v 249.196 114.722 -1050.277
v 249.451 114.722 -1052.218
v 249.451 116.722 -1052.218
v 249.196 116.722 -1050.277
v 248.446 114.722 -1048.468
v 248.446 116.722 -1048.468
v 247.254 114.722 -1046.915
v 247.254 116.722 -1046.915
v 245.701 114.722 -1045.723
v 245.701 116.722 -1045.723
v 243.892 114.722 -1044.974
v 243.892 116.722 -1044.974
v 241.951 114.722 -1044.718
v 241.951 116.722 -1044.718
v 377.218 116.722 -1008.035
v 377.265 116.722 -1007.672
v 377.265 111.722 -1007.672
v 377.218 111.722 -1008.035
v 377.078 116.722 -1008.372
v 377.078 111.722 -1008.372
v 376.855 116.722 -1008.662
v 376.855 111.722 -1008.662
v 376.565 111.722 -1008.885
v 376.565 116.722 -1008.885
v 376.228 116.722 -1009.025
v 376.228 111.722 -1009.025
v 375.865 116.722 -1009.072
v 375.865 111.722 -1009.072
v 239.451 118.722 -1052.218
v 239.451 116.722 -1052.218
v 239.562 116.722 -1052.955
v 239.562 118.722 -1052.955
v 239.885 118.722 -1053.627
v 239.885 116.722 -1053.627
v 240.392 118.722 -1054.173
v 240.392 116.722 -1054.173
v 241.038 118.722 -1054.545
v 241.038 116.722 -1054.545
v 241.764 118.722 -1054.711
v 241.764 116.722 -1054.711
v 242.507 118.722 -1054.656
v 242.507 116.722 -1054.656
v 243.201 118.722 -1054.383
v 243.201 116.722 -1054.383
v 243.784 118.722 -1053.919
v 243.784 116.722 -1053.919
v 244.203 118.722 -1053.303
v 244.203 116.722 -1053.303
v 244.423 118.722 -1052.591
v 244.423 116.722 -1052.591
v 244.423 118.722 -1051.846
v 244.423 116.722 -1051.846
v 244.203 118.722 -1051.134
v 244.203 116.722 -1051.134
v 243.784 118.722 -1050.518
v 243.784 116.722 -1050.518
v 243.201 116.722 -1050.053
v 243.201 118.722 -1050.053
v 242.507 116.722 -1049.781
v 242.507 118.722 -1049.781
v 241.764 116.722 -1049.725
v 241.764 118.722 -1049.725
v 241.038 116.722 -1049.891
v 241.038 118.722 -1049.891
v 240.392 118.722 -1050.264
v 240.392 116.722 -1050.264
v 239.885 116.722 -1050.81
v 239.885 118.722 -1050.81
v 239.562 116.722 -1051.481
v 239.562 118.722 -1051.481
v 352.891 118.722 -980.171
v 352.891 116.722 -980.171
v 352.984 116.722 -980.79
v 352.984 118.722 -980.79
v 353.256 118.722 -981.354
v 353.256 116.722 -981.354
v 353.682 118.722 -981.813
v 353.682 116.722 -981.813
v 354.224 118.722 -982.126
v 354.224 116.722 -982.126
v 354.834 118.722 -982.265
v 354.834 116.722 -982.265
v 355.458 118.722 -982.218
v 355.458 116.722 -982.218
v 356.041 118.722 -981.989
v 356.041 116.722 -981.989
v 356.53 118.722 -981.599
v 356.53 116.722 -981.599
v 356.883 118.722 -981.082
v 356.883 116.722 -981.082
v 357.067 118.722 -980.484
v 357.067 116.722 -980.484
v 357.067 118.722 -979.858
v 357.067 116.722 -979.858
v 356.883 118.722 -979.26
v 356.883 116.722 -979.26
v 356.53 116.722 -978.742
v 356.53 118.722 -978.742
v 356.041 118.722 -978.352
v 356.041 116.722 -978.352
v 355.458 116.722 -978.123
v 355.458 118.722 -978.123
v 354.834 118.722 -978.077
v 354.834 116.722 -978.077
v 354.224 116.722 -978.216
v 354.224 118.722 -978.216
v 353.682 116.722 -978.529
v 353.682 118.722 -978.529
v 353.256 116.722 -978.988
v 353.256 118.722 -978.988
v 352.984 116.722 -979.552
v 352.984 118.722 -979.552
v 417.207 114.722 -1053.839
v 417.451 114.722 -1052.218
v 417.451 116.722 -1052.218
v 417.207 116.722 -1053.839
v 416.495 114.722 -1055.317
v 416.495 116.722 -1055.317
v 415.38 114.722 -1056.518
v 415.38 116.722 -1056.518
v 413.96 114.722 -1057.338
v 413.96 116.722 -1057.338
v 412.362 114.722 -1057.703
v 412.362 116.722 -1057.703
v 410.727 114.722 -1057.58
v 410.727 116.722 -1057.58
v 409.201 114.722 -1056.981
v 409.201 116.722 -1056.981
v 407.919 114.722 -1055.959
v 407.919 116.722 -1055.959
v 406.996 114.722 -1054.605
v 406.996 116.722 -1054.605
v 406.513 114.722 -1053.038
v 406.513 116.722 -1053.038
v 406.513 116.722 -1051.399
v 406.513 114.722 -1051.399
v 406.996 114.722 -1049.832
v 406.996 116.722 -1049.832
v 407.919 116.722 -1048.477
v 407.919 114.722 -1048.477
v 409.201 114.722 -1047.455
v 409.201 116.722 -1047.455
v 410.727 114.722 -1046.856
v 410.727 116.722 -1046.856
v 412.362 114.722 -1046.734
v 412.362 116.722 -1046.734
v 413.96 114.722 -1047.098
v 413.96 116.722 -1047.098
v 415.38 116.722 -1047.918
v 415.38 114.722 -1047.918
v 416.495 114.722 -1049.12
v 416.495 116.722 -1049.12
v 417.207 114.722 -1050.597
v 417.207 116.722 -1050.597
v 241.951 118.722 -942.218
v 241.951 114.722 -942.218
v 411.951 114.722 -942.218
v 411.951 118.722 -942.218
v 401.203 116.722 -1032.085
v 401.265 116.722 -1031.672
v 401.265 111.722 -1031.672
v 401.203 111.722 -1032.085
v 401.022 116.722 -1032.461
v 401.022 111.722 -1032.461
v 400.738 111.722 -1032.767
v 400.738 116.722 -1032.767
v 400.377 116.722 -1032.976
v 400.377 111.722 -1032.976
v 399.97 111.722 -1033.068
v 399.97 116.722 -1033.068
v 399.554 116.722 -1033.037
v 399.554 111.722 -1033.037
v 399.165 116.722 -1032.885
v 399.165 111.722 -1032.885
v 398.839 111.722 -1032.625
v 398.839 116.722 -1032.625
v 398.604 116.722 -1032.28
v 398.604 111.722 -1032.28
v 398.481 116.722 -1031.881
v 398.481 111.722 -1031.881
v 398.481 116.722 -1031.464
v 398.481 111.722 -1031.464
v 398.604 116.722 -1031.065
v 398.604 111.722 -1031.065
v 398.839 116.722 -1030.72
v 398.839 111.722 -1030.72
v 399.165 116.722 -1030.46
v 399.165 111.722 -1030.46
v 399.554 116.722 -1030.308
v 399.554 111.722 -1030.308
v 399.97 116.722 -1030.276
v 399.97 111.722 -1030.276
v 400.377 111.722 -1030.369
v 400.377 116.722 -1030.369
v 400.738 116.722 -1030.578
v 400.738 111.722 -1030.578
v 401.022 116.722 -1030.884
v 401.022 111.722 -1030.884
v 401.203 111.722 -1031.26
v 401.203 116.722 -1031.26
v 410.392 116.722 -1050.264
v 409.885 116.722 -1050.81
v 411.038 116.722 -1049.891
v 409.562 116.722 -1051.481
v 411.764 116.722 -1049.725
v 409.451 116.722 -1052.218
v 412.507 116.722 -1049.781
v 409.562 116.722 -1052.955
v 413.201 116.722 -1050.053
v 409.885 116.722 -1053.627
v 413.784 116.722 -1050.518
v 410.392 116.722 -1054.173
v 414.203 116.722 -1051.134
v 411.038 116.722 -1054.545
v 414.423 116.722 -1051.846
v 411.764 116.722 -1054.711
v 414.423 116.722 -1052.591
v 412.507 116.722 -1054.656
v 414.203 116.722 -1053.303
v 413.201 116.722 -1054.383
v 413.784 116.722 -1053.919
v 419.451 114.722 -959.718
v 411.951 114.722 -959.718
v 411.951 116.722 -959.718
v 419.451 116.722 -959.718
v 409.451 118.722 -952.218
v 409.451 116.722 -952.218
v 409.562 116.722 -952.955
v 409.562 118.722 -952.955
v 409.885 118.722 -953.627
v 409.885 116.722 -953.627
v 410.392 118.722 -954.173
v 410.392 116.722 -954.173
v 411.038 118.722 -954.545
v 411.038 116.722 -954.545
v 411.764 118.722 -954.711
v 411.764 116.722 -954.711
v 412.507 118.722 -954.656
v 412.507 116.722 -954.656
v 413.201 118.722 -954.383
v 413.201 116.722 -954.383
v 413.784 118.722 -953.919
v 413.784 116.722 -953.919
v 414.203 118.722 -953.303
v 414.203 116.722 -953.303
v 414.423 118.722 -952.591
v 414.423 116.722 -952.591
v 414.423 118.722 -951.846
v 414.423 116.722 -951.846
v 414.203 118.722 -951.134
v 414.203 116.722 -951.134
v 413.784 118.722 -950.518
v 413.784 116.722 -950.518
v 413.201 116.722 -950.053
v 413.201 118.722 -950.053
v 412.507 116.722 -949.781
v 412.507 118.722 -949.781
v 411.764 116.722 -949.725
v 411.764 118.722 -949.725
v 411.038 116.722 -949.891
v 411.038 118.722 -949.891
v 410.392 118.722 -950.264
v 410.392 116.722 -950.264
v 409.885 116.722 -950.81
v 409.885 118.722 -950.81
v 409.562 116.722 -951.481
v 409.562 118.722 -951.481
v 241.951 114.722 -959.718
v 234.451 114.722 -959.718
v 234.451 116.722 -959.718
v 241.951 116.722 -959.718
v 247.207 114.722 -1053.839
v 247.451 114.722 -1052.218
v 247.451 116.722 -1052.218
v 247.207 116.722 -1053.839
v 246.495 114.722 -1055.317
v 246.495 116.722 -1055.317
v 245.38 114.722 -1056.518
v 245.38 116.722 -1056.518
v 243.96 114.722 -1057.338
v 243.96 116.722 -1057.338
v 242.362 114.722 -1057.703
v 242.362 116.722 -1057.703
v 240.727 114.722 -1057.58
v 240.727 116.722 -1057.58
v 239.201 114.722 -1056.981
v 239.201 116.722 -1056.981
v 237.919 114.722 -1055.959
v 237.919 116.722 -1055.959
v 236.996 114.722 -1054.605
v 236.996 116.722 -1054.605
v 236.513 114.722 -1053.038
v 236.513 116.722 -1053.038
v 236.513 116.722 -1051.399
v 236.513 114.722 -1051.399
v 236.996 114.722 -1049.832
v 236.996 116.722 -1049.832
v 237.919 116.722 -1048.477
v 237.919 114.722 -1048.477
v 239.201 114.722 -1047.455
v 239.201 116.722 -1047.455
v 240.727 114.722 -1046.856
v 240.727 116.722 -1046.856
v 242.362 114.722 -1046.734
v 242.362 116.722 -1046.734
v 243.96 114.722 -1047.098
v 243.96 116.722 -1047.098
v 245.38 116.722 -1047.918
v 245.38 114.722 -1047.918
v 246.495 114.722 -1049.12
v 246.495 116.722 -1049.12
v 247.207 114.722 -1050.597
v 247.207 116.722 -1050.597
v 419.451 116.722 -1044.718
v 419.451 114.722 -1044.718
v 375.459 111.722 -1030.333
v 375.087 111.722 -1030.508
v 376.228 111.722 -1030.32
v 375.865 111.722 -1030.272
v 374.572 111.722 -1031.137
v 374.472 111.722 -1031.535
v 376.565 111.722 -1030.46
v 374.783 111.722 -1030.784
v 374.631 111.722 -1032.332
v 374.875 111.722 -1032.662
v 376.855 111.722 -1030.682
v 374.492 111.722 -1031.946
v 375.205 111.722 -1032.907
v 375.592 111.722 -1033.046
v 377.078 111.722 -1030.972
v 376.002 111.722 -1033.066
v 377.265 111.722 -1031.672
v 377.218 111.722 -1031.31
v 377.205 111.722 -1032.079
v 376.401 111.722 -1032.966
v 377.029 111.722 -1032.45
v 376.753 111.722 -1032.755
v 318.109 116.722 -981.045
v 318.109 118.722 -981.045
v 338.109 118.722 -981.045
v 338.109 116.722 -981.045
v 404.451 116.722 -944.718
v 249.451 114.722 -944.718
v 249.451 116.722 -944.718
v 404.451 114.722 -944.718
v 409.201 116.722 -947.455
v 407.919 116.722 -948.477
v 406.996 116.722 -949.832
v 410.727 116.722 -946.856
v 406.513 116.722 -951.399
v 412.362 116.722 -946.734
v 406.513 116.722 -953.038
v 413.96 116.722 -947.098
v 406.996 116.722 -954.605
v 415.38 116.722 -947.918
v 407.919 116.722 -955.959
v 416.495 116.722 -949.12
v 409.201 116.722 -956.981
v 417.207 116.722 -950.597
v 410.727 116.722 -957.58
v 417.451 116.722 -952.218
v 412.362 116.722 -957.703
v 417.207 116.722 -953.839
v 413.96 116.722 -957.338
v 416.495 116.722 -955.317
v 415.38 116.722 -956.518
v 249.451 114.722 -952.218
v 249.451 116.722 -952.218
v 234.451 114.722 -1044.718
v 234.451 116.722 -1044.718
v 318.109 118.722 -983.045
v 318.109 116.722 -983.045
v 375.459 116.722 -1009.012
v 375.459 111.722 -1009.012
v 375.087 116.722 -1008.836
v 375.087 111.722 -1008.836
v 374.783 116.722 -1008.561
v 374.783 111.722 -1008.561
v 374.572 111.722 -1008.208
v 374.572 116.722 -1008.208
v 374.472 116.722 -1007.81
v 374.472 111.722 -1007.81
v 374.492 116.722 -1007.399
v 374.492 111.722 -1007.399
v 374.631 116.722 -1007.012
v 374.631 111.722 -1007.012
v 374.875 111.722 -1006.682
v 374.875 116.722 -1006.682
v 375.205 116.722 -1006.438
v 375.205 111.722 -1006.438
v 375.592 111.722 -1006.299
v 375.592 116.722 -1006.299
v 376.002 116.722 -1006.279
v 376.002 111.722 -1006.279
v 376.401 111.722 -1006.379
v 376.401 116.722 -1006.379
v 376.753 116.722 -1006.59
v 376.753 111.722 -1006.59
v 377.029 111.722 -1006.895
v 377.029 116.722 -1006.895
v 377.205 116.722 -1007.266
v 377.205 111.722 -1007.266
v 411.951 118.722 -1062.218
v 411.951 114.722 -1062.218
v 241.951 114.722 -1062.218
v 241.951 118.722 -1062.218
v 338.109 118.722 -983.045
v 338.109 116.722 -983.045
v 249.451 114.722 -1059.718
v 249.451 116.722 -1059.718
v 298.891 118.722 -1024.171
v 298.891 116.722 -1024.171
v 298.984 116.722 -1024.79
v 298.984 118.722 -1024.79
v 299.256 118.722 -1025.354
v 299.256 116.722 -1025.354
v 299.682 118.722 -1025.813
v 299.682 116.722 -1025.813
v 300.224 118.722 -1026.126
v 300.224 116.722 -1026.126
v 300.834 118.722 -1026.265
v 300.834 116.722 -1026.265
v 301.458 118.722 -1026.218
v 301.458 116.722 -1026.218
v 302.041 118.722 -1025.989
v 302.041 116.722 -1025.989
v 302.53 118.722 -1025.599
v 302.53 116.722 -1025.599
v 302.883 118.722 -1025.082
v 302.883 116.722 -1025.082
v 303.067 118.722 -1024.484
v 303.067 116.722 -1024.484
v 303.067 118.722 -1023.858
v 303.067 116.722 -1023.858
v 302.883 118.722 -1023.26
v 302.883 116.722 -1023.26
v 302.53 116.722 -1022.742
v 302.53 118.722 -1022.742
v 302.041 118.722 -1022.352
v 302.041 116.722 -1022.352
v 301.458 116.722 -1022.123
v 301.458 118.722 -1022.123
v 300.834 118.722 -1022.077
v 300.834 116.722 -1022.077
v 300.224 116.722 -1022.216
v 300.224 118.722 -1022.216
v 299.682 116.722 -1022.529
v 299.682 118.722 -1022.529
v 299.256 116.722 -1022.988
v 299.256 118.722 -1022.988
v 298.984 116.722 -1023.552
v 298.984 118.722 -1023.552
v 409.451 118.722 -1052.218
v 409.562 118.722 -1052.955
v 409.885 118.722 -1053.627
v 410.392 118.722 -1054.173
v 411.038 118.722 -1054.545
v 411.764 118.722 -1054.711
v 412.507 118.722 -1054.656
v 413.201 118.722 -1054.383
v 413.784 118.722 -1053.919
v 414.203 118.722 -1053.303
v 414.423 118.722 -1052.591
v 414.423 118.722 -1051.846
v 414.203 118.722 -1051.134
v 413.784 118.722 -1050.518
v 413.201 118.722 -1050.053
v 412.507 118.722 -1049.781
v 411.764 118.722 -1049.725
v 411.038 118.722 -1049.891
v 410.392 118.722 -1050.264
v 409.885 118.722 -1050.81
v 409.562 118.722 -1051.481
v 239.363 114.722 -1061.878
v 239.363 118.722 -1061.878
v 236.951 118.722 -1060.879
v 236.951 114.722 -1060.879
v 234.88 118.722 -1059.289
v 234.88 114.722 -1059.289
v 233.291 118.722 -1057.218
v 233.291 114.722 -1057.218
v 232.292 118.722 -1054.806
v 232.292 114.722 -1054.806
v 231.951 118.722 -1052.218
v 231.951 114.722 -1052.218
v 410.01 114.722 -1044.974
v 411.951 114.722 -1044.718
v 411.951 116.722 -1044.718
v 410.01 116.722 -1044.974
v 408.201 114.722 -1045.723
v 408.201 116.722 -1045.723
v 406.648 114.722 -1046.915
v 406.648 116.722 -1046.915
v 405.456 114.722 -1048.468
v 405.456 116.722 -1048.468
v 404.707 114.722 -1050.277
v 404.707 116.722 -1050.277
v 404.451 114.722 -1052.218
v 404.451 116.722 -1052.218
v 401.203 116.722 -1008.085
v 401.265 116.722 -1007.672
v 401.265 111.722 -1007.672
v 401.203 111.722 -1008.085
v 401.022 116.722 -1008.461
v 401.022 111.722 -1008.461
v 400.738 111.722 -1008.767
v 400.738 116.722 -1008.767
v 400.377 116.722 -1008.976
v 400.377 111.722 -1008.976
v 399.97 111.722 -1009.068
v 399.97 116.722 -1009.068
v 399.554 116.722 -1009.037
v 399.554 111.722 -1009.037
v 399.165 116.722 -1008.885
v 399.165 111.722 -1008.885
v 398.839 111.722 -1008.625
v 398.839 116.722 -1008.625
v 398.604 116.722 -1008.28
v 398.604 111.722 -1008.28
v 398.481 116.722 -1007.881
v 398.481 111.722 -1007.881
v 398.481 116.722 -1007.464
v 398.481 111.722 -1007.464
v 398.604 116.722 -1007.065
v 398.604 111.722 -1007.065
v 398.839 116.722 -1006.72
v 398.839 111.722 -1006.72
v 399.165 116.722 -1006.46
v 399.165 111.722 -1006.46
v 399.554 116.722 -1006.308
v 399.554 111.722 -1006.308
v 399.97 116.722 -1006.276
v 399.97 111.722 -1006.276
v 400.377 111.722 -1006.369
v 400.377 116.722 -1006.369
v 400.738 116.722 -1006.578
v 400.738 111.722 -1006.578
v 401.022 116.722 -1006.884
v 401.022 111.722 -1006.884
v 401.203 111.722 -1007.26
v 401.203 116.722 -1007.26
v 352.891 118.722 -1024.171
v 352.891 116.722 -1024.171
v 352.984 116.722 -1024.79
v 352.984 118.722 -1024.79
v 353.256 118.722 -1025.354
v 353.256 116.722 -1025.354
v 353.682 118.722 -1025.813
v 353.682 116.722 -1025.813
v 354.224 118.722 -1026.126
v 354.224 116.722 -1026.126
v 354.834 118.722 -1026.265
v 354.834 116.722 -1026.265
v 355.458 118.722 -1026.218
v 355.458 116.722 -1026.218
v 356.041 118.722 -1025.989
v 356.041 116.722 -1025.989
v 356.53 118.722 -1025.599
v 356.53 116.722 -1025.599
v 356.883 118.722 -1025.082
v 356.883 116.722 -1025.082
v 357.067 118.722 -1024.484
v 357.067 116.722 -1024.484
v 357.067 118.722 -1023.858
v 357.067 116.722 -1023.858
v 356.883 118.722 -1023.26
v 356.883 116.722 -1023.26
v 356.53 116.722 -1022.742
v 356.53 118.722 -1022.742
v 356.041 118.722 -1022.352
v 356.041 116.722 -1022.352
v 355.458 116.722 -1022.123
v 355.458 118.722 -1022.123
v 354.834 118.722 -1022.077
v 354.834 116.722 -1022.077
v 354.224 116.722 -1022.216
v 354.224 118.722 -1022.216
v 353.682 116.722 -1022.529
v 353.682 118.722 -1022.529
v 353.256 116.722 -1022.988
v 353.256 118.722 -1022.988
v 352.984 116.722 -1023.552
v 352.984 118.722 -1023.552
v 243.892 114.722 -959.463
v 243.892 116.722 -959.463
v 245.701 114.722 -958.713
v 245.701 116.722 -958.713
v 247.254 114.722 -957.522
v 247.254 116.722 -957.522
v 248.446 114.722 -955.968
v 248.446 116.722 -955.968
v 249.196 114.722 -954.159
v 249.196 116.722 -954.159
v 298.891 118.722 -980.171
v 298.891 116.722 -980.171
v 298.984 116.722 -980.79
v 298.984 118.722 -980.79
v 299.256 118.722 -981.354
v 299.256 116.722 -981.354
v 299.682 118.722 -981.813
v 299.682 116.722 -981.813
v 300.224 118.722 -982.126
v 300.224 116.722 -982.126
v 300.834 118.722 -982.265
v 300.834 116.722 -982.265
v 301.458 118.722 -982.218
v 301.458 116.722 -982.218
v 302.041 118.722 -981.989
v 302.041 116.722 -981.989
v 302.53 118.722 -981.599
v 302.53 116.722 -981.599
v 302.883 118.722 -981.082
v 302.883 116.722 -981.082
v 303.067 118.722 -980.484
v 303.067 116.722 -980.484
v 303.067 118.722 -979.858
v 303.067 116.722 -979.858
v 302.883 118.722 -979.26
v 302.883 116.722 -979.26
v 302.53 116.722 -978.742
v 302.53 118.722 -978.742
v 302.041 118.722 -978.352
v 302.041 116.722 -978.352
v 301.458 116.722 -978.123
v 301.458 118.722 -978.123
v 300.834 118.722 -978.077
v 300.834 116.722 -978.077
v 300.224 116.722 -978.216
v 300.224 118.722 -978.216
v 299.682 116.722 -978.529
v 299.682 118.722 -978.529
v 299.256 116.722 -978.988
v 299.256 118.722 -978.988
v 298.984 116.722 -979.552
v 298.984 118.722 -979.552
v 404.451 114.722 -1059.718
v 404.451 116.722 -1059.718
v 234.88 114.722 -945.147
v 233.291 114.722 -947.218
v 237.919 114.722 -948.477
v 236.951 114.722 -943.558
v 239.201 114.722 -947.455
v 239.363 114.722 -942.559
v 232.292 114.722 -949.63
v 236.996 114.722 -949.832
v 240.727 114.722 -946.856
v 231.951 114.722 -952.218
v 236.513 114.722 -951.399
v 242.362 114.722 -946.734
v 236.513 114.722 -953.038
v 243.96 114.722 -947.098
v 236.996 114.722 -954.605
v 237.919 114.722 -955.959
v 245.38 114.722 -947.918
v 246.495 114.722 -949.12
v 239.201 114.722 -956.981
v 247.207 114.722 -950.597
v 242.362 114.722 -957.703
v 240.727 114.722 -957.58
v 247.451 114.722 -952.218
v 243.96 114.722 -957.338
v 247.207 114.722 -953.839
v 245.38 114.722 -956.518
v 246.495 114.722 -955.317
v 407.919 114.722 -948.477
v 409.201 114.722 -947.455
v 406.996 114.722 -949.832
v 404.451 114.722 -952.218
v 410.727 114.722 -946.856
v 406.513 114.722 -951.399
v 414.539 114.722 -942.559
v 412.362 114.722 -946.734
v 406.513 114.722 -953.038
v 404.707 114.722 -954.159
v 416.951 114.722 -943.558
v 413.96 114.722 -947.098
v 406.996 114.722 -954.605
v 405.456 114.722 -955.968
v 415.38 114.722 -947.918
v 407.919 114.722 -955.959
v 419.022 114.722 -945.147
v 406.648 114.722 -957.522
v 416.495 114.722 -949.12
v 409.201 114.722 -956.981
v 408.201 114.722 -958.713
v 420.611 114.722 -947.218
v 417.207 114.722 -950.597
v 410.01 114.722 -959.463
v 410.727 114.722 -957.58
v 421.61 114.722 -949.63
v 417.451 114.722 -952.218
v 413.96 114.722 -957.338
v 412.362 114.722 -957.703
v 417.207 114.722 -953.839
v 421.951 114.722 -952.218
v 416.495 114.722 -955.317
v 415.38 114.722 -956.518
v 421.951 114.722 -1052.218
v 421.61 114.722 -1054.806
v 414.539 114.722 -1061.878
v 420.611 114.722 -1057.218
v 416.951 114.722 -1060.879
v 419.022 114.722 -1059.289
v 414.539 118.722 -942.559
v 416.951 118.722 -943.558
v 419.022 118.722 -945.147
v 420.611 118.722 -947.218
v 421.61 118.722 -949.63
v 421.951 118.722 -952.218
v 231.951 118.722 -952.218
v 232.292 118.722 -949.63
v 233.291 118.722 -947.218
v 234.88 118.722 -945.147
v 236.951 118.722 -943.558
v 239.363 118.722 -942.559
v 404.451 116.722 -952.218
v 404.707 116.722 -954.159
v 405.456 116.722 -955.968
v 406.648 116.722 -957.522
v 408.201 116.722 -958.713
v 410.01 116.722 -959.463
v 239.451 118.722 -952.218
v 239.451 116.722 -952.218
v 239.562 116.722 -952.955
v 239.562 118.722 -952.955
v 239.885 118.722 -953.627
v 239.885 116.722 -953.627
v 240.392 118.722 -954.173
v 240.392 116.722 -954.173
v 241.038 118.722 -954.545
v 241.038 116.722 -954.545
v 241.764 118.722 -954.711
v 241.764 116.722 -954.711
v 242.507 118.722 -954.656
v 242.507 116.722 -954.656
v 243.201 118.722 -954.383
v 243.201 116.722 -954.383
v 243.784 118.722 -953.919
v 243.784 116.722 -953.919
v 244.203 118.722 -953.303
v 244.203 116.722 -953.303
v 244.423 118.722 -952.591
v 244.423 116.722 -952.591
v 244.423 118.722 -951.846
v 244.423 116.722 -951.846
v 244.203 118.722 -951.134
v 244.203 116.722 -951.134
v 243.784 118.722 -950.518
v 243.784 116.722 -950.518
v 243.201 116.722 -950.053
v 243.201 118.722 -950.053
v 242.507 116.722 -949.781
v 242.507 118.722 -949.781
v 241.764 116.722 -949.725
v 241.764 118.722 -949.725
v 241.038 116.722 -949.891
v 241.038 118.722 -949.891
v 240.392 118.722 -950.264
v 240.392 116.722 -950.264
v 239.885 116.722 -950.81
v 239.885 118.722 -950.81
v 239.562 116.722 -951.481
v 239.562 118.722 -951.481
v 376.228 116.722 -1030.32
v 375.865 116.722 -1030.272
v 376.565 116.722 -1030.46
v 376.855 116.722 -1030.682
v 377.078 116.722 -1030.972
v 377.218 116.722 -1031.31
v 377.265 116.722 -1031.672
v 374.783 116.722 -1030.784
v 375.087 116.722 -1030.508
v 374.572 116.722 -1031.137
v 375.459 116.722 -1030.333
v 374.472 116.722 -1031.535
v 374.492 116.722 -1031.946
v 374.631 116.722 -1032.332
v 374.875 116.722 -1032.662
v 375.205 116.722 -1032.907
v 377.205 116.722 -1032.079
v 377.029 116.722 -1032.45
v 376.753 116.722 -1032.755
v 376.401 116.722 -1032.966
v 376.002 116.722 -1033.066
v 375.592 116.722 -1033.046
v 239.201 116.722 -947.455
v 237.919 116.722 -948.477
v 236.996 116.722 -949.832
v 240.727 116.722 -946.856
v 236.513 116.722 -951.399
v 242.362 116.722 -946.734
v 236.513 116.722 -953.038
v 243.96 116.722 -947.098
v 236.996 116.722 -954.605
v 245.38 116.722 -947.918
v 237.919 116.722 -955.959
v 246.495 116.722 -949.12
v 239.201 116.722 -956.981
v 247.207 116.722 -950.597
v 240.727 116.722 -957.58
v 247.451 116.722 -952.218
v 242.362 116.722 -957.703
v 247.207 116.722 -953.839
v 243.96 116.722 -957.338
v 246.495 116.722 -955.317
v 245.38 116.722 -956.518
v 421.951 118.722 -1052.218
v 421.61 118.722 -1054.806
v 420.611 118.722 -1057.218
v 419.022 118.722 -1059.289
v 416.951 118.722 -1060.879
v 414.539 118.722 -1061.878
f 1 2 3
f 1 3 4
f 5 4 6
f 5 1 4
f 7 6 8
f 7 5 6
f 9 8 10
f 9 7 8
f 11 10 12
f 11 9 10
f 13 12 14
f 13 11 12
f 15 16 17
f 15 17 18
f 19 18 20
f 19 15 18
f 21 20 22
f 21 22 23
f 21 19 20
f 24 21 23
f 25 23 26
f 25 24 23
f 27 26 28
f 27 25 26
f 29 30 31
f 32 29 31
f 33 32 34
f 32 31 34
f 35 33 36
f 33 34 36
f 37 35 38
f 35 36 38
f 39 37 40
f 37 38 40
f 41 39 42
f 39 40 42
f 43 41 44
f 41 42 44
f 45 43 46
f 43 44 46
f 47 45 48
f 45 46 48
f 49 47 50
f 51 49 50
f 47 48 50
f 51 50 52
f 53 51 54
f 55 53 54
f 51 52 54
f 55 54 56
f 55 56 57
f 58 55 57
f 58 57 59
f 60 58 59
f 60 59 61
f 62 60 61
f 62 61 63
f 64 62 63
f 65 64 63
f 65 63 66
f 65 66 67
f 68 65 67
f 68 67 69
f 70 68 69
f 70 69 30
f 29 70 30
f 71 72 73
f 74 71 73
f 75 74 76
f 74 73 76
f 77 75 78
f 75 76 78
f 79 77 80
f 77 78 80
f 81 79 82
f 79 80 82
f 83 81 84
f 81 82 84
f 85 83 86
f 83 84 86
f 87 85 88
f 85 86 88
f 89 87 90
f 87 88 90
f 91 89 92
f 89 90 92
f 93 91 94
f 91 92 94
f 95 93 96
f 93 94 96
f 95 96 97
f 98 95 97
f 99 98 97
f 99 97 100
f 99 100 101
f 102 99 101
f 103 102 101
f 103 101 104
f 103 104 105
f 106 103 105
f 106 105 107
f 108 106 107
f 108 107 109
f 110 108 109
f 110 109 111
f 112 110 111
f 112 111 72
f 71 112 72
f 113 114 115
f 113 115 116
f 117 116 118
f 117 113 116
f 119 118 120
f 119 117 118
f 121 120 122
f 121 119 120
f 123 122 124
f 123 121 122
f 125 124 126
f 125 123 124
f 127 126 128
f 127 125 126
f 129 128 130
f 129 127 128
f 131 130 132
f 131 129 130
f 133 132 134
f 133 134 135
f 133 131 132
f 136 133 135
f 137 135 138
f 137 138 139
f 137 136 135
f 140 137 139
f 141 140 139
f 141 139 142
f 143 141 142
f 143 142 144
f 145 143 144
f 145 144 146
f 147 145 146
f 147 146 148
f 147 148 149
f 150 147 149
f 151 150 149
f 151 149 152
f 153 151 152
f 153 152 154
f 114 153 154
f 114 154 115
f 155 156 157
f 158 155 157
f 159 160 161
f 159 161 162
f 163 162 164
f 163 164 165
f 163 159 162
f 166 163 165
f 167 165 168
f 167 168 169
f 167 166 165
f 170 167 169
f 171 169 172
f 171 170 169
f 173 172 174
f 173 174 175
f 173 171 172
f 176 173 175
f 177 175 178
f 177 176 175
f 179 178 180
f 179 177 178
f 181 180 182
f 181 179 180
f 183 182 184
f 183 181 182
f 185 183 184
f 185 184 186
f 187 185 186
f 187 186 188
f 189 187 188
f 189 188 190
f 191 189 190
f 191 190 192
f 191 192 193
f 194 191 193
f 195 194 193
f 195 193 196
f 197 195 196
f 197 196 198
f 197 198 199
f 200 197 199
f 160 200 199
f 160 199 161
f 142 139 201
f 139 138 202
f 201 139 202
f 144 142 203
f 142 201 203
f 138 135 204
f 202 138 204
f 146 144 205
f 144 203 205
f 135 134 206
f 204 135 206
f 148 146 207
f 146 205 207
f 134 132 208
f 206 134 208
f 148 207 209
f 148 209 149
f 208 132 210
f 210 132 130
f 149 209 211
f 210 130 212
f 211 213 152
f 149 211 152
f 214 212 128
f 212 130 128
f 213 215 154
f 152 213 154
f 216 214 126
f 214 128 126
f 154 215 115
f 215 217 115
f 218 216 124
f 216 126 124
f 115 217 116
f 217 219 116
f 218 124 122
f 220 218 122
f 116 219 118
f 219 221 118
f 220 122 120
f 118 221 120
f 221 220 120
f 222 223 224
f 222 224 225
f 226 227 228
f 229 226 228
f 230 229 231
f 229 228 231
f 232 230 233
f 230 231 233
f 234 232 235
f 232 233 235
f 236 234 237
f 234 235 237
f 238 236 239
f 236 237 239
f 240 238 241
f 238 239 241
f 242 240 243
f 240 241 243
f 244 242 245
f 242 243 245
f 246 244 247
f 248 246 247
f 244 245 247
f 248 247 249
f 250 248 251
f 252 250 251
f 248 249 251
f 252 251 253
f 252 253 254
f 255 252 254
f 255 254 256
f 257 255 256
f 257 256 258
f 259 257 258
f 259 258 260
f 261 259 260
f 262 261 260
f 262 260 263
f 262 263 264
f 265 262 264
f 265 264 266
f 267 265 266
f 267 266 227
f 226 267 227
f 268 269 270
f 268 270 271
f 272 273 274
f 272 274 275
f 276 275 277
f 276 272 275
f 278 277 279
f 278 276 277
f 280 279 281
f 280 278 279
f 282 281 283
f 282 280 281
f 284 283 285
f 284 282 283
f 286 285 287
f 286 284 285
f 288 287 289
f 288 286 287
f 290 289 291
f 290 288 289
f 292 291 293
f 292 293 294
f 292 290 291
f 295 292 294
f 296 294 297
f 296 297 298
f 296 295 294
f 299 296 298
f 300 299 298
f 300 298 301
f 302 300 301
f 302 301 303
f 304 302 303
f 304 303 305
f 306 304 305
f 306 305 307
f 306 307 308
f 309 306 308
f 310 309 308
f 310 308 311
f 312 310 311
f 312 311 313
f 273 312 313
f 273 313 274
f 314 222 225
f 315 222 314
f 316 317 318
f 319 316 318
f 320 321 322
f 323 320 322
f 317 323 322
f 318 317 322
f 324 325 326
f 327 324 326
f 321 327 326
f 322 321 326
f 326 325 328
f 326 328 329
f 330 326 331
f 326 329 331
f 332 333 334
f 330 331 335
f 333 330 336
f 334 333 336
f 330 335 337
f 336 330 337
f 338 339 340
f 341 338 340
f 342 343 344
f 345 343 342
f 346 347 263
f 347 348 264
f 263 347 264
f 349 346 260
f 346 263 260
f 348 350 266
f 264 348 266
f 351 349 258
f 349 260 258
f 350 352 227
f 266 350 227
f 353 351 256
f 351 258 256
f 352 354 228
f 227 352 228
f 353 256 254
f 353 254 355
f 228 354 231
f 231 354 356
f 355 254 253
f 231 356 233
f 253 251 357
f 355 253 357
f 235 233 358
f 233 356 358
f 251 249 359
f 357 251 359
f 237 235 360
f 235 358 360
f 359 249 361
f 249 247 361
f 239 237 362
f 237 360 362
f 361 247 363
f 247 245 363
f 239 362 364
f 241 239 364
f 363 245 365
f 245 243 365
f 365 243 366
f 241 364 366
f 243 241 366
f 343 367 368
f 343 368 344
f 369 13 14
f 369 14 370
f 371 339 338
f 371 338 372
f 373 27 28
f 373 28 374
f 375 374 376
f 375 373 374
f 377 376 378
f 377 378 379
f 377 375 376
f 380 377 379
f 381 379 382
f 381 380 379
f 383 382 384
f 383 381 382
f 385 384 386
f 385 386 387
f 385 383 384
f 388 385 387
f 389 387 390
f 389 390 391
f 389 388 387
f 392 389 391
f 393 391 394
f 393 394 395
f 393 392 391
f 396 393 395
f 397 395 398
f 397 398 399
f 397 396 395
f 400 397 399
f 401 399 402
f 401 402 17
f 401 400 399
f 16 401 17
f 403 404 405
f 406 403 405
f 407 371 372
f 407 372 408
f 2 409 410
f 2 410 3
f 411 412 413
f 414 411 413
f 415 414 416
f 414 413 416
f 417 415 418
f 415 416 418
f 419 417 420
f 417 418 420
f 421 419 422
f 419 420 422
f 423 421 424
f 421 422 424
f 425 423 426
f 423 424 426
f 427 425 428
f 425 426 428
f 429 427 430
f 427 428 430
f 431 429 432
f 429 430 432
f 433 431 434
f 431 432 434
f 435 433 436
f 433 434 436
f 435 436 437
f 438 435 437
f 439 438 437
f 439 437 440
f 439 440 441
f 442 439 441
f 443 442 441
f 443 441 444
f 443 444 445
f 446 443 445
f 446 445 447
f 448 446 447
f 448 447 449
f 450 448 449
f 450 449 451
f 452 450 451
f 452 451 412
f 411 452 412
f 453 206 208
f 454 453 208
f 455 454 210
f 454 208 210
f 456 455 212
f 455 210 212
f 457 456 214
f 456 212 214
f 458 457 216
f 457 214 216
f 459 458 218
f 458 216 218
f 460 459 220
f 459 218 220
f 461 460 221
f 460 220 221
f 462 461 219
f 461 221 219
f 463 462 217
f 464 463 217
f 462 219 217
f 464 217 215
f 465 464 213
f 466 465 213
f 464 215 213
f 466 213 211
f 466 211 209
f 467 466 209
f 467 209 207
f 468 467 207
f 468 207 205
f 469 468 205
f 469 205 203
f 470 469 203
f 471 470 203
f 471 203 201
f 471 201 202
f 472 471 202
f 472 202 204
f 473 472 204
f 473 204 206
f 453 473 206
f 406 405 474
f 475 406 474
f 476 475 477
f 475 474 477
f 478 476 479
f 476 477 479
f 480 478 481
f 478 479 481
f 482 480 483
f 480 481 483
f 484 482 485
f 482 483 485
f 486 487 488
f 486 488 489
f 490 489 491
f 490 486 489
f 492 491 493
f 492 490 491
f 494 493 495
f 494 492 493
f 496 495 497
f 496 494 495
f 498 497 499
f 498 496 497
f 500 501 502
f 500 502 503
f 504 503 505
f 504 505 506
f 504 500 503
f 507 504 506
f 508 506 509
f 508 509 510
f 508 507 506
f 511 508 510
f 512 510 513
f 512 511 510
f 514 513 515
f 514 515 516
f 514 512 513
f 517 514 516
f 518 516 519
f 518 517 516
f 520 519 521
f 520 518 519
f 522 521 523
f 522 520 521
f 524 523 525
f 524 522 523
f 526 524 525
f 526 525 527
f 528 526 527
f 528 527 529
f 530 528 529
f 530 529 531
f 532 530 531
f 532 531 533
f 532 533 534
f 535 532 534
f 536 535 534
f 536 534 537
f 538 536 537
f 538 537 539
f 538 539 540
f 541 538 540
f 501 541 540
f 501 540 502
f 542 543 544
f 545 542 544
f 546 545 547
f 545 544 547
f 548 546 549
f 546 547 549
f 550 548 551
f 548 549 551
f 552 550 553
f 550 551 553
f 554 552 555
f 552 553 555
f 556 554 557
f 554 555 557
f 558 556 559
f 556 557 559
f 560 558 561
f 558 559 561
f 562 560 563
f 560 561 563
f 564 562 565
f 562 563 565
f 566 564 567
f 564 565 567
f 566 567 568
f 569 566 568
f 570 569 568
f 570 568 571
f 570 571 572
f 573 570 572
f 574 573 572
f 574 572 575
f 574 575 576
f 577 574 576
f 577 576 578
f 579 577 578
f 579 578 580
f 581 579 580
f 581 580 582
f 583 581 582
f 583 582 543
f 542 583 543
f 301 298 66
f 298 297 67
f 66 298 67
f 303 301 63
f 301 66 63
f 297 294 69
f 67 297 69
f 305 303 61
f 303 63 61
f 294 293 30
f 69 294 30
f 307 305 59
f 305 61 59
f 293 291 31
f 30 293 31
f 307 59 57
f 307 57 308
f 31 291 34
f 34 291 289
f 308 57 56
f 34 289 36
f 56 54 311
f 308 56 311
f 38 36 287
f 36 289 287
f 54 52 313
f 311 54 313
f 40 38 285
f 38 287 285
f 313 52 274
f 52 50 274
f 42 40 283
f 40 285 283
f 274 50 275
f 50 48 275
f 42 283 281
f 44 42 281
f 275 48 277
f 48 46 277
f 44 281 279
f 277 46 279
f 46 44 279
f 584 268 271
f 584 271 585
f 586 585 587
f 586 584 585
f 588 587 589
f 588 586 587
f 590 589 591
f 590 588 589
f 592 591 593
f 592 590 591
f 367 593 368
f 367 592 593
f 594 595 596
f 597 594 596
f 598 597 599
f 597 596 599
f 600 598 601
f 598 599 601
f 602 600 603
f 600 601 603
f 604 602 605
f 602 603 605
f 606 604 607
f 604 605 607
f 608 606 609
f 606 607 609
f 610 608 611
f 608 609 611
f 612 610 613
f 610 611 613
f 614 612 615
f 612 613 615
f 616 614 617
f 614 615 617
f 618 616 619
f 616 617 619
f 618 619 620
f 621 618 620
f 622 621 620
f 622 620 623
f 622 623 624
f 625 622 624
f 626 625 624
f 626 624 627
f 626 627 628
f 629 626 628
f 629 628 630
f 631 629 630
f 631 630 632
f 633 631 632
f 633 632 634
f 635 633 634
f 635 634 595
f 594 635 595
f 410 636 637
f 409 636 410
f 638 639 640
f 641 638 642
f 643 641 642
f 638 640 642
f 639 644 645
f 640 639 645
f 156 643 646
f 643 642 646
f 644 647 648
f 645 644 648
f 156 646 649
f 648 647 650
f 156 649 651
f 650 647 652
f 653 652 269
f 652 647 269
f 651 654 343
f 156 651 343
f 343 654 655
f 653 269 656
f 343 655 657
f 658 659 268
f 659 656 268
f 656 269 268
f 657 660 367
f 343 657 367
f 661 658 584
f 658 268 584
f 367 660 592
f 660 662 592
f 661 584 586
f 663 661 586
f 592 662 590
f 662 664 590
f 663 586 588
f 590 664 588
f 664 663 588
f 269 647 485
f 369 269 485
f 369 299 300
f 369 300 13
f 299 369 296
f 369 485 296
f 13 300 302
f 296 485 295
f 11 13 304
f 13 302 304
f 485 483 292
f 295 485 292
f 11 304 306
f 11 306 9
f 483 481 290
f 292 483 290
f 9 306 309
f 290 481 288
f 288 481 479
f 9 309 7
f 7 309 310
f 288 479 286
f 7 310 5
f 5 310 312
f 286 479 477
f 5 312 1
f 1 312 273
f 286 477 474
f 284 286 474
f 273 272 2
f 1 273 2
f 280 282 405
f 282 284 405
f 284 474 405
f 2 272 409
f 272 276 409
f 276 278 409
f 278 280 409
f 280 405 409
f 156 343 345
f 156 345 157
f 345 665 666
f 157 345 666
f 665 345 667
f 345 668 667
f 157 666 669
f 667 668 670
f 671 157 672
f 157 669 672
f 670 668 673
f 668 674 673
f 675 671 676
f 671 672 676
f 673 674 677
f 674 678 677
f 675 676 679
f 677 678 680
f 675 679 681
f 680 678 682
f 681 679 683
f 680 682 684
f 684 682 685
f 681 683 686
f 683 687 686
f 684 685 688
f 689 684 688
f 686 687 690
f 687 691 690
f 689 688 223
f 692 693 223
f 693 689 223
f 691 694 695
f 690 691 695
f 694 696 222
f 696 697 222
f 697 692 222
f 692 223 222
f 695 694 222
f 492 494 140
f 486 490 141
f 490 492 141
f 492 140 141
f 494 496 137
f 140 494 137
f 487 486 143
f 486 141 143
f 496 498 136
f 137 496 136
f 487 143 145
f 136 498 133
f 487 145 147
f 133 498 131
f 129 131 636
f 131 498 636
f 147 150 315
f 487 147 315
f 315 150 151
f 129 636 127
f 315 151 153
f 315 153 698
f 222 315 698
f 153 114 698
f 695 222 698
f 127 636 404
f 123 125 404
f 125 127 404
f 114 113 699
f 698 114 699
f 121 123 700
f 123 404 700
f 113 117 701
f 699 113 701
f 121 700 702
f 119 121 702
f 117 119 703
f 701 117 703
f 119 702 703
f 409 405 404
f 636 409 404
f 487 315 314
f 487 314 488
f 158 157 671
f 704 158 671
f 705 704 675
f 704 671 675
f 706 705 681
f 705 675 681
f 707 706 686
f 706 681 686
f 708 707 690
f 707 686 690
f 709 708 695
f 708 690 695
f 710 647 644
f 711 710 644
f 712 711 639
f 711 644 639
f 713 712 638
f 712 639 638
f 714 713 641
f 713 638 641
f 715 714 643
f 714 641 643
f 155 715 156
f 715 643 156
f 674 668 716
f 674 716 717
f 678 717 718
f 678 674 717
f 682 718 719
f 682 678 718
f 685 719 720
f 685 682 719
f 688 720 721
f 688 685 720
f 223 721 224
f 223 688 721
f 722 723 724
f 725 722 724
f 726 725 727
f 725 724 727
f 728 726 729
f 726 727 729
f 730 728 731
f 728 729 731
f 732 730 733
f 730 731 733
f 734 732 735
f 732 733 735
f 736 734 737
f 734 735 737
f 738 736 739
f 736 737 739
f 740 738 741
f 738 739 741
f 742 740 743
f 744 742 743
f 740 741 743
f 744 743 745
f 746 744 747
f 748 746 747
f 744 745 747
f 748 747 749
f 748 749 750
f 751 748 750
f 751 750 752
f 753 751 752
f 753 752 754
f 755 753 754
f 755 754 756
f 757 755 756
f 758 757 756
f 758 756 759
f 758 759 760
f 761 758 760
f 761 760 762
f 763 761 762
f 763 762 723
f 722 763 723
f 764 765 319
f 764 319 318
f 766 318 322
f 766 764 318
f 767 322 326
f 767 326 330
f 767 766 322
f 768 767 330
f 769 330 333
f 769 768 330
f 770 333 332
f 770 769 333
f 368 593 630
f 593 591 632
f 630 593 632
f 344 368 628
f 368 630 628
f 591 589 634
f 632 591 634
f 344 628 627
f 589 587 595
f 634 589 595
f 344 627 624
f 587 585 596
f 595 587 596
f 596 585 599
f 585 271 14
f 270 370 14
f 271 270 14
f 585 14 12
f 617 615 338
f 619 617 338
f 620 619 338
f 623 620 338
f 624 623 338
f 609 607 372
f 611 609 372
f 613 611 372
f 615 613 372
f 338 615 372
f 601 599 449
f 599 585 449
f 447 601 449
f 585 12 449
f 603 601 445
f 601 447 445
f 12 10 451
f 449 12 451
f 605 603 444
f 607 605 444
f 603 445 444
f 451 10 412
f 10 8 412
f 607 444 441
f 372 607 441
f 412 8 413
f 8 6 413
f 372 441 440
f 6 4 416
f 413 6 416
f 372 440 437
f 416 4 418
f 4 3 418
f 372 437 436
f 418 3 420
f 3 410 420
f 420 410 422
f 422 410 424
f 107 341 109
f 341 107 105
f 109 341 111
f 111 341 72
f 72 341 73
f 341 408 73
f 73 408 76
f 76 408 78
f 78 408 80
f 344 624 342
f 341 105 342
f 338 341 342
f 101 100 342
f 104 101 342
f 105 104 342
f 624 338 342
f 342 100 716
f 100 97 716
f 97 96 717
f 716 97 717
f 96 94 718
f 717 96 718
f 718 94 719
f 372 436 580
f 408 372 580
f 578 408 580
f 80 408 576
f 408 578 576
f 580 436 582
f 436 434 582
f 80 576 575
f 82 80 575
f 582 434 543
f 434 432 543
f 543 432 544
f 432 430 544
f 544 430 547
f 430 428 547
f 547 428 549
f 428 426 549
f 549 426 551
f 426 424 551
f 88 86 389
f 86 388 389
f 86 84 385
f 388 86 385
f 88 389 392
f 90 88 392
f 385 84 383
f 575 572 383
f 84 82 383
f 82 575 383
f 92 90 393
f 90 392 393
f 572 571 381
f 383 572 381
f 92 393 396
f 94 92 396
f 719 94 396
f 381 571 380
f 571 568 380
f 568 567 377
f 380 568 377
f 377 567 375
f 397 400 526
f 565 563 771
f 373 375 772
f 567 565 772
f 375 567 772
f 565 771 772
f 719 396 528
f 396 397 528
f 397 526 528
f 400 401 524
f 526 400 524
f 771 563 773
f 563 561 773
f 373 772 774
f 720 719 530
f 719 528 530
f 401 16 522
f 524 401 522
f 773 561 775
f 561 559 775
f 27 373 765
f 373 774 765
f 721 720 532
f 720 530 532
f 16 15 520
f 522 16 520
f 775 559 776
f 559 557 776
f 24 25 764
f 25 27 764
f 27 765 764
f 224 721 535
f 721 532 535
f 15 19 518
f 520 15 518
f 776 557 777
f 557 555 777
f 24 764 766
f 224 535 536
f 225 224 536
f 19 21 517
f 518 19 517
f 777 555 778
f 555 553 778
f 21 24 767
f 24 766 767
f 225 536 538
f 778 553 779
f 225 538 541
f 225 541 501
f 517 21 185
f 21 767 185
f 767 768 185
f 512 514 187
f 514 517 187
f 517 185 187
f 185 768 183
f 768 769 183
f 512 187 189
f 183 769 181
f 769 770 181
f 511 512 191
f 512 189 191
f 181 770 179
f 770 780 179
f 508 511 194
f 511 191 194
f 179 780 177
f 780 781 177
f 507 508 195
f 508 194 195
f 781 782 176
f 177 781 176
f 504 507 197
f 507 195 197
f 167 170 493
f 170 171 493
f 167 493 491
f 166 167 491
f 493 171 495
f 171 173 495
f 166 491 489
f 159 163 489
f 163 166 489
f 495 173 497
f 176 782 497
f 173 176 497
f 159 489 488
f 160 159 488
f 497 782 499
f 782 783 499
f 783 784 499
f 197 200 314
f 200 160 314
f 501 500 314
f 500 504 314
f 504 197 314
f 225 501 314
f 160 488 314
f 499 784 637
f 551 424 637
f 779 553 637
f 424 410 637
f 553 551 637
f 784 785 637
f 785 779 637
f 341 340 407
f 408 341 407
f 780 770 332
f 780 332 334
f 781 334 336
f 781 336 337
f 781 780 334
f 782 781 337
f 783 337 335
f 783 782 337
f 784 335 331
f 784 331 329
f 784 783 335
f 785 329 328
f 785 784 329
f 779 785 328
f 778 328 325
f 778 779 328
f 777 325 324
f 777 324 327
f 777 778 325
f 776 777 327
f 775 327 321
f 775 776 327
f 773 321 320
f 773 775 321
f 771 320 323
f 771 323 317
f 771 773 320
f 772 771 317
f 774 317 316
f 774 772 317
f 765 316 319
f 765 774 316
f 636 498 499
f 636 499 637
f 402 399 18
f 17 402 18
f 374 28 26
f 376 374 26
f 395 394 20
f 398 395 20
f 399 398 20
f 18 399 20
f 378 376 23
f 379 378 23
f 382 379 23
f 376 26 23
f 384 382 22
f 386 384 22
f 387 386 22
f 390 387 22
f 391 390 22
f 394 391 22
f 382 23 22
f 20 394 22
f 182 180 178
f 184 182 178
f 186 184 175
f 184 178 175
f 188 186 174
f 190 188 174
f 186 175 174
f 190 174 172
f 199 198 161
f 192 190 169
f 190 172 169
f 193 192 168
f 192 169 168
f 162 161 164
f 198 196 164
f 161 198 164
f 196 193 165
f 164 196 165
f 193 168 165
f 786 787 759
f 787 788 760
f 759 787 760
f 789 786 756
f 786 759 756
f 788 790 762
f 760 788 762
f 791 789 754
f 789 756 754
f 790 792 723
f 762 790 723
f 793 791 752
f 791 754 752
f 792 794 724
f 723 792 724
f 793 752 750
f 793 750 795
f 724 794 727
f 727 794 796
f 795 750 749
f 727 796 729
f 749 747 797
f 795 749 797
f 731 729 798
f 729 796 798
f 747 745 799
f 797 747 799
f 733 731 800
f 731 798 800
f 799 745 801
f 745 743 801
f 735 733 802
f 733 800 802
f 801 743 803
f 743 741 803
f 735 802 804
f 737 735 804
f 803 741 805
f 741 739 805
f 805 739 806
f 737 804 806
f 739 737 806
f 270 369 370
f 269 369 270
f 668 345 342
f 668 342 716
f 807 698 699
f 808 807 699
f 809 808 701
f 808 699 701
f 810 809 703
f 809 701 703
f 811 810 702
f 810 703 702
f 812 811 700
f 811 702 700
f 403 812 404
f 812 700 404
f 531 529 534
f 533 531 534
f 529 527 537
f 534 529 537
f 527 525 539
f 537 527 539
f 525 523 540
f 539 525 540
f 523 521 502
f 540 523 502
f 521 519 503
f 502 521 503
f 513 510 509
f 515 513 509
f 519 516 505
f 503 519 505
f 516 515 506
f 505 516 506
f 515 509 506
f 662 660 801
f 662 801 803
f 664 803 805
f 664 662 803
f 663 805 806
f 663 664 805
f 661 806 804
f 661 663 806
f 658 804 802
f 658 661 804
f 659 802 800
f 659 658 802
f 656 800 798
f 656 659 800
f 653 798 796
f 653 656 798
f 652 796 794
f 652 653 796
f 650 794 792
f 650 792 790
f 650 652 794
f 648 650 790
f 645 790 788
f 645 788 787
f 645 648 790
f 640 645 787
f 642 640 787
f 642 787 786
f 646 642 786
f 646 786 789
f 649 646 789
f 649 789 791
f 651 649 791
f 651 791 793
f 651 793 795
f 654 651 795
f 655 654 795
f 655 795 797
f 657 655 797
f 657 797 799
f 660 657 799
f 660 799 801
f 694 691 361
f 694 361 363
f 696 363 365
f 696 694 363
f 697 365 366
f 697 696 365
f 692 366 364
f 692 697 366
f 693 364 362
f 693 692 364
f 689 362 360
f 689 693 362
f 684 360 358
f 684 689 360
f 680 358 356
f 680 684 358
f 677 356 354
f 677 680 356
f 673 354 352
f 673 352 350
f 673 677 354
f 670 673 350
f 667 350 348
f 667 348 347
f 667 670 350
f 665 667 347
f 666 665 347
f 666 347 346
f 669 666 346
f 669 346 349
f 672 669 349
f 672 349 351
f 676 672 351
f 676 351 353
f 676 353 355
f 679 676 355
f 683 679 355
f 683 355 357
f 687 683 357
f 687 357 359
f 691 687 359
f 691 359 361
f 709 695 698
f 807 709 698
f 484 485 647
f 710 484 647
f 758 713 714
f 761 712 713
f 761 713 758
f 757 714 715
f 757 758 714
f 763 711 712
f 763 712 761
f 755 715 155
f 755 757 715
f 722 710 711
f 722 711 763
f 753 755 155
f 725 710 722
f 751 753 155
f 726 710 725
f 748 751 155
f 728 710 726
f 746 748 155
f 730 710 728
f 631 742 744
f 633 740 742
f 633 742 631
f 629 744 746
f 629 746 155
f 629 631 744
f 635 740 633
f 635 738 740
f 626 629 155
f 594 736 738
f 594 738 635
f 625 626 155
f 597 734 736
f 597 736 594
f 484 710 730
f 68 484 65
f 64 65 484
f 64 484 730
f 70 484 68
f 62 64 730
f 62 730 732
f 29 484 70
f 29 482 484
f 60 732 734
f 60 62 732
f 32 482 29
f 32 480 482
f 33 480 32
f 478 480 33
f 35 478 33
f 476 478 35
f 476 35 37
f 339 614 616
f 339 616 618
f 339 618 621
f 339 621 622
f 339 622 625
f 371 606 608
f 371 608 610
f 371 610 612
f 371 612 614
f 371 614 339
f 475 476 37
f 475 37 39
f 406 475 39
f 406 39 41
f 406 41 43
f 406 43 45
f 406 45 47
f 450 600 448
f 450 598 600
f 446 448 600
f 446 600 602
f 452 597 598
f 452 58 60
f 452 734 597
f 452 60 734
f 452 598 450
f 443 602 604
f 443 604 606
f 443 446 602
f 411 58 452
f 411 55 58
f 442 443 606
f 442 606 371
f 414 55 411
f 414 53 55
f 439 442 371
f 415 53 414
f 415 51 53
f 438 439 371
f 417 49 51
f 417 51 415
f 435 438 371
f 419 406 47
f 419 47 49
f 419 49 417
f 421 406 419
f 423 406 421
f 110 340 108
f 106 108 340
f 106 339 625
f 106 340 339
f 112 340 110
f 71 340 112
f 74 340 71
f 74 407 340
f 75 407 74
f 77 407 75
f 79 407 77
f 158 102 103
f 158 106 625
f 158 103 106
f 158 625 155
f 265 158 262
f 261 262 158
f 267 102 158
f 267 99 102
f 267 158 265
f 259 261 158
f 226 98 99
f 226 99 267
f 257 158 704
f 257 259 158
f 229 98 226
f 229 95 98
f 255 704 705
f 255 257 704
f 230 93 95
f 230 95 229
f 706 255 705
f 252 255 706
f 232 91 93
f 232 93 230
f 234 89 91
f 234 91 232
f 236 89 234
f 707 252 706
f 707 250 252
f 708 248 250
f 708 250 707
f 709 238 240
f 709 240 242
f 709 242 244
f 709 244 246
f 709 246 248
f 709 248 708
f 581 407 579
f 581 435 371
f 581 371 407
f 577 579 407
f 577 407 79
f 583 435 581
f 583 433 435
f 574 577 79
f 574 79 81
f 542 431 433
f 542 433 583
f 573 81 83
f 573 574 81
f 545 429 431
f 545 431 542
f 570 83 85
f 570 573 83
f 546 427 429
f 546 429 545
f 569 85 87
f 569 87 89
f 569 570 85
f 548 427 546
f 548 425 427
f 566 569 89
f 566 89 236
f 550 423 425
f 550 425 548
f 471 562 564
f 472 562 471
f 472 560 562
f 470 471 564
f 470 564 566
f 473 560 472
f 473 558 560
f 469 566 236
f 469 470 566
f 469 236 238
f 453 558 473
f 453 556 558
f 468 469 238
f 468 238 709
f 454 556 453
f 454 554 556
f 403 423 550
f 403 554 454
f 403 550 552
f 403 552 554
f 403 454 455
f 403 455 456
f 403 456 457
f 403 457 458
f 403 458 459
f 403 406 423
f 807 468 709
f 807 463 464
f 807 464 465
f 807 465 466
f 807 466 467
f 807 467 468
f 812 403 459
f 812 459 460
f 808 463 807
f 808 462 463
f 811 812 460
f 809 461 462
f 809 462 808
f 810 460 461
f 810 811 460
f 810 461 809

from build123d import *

# Parameters (mm, degrees)
SKETCH1_R                      = 5.5
BOSS_EXTRUDE1_DEPTH            = 5
BOSS_EXTRUDE2_DEPTH            = 2
SKETCH4_R                      = 1.4
BOSS_EXTRUDE3_DEPTH            = 7
SKETCH12_W                     = 20
SKETCH12_H                     = 2
CUT_EXTRUDE1_DEPTH             = 10
F_4_2_4_2_DIAMETER_HOLE1_D     = 4.2
F_4_2_4_2_DIAMETER_HOLE1_DEPTH = 20
F_4_2_4_2_DIAMETER_HOLE1_TIP   = 1.2618073
F_5_0_5_DIAMETER_HOLE1_D       = 5
F_5_0_5_DIAMETER_HOLE1_DEPTH   = 5
F_5_0_5_DIAMETER_HOLE1_TIP     = 1.502151548
SKETCH1_3_R                    = 5.5
CUT_EXTRUDE2_DEPTH             = 3


with BuildPart() as part:
    # Sketch1 → Boss-Extrude1 (new body)
    with BuildSketch(Plane(origin=(0, 111.722415865, 0), x_dir=(1, 0, 0), z_dir=(0, 1, 0))):
        with BuildLine():
            Line((241.95107426, 942.218289838), (411.95107426, 942.218289838))
            ThreePointArc((411.95107426, 942.218289838), (419.022142072, 945.147222026), (421.95107426, 952.218289838))
            Line((421.95107426, 952.218289838), (421.95107426, 1052.218289838))
            ThreePointArc((421.95107426, 1052.218289838), (419.022142072, 1059.28935765), (411.95107426, 1062.218289838))
            Line((411.95107426, 1062.218289838), (241.95107426, 1062.218289838))
            ThreePointArc((241.95107426, 1062.218289838), (234.880006448, 1059.28935765), (231.95107426, 1052.218289838))
            Line((231.95107426, 1052.218289838), (231.95107426, 952.218289838))
            ThreePointArc((231.95107426, 952.218289838), (234.880006448, 945.147222026), (241.95107426, 942.218289838))
        make_face()
        with Locations((241.95107426, 952.218289838)):
            Circle(SKETCH1_R, mode=Mode.SUBTRACT)
        with Locations((411.95107426, 952.218289838)):
            Circle(SKETCH1_R, mode=Mode.SUBTRACT)
        with Locations((411.95107426, 1052.218289838)):
            Circle(SKETCH1_R, mode=Mode.SUBTRACT)
        with Locations((241.95107426, 1052.218289838)):
            Circle(SKETCH1_R, mode=Mode.SUBTRACT)
        with BuildLine():
            Line((249.45107426, 952.218289838), (249.45107426, 944.718289838))
            Line((249.45107426, 944.718289838), (404.45107426, 944.718289838))
            Line((404.45107426, 944.718289838), (404.45107426, 952.218289838))
            ThreePointArc((404.45107426, 952.218289838), (406.647773401, 957.521590697), (411.95107426, 959.718289838))
            Line((411.95107426, 959.718289838), (419.45107426, 959.718289838))
            Line((419.45107426, 959.718289838), (419.45107426, 1044.718289838))
            Line((419.45107426, 1044.718289838), (411.95107426, 1044.718289838))
            ThreePointArc((411.95107426, 1044.718289838), (406.647773401, 1046.914988979), (404.45107426, 1052.218289838))
            Line((404.45107426, 1052.218289838), (404.45107426, 1059.718289838))
            Line((404.45107426, 1059.718289838), (249.45107426, 1059.718289838))
            Line((249.45107426, 1059.718289838), (249.45107426, 1052.218289838))
            ThreePointArc((249.45107426, 1052.218289838), (247.254375119, 1046.914988979), (241.95107426, 1044.718289838))
            Line((241.95107426, 1044.718289838), (234.45107426, 1044.718289838))
            Line((234.45107426, 1044.718289838), (234.45107426, 959.718289838))
            Line((234.45107426, 959.718289838), (241.95107426, 959.718289838))
            ThreePointArc((241.95107426, 959.718289838), (247.254375119, 957.521590697), (249.45107426, 952.218289838))
        make_face(mode=Mode.SUBTRACT)
    extrude(amount=BOSS_EXTRUDE1_DEPTH)

    # Sketch2 → Boss-Extrude2 (add)
    with BuildSketch(Plane(origin=(0, 116.722415865, 0), x_dir=(1, 0, 0), z_dir=(0, 1, 0))):
        with BuildLine():
            Line((231.95107426, 1052.218289838), (231.95107426, 952.218289838))
            ThreePointArc((231.95107426, 952.218289838), (234.880006448, 945.147222026), (241.95107426, 942.218289838))
            Line((241.95107426, 942.218289838), (411.95107426, 942.218289838))
            ThreePointArc((411.95107426, 942.218289838), (419.022142072, 945.147222026), (421.95107426, 952.218289838))
            Line((421.95107426, 952.218289838), (421.95107426, 1052.218289838))
            ThreePointArc((421.95107426, 1052.218289838), (419.022142072, 1059.28935765), (411.95107426, 1062.218289838))
            Line((411.95107426, 1062.218289838), (241.95107426, 1062.218289838))
            ThreePointArc((241.95107426, 1062.218289838), (234.880006448, 1059.28935765), (231.95107426, 1052.218289838))
        make_face()
    extrude(amount=BOSS_EXTRUDE2_DEPTH)

    # Sketch4 → Boss-Extrude3 (add)
    with BuildSketch(Plane(origin=(0, 118.722415865, 0), x_dir=(1, 0, 0), z_dir=(0, 1, 0))):
        with BuildLine():
            Line((375.86522753, 1030.272411662), (375.86522753, 1031.672411662))
            Line((375.86522753, 1031.672411662), (377.26522753, 1031.672411662))
            ThreePointArc((377.26522753, 1031.672411662), (374.875278036, 1032.662361156), (375.86522753, 1030.272411662))
        make_face()
        with BuildLine():
            Line((377.26522753, 1031.672411662), (375.86522753, 1031.672411662))
            Line((375.86522753, 1031.672411662), (375.86522753, 1030.272411662))
            ThreePointArc((375.86522753, 1030.272411662), (376.855177023, 1030.682462168), (377.26522753, 1031.672411662))
        make_face()
        with BuildLine():
            ThreePointArc((377.26522753, 1007.672411662), (376.855177023, 1008.662361156), (375.86522753, 1009.072411662))
            Line((375.86522753, 1009.072411662), (375.86522753, 1007.672411662))
            Line((375.86522753, 1007.672411662), (377.26522753, 1007.672411662))
        make_face()
        with BuildLine():
            Line((375.86522753, 1007.672411662), (375.86522753, 1009.072411662))
            ThreePointArc((375.86522753, 1009.072411662), (374.875278036, 1006.682462168), (377.26522753, 1007.672411662))
            Line((377.26522753, 1007.672411662), (375.86522753, 1007.672411662))
        make_face()
        with Locations((399.86522753, 1031.672411662)):
            Circle(SKETCH4_R)
        with Locations((399.86522753, 1007.672411662)):
            Circle(SKETCH4_R)
    extrude(amount=-BOSS_EXTRUDE3_DEPTH)

    # Sketch12 → Cut-Extrude1 (cut)
    with BuildSketch(Plane(origin=(0, 118.722415865, 0), x_dir=(1, 0, 0), z_dir=(0, 1, 0))):
        with Locations((328.108762335, 982.045276567)):
            Rectangle(SKETCH12_W, SKETCH12_H)
    extrude(amount=-CUT_EXTRUDE1_DEPTH, mode=Mode.SUBTRACT)

    # Ø4.2 (4.2) Diameter Hole1
    with Locations(Plane(origin=(0, 118.722415865, 0), x_dir=(1, 0, 0), z_dir=(0, 1, 0))):
        with Locations((300.990952506, 1024.17077451), (354.990952506, 1024.17077451), (354.990952506, 980.17077451), (300.990952506, 980.17077451)):
            Hole(F_4_2_4_2_DIAMETER_HOLE1_D / 2, depth=F_4_2_4_2_DIAMETER_HOLE1_DEPTH)
            with Locations((0, 0, -(F_4_2_4_2_DIAMETER_HOLE1_DEPTH + F_4_2_4_2_DIAMETER_HOLE1_TIP / 2))):  # 118° drill point
                Cone(0, F_4_2_4_2_DIAMETER_HOLE1_D / 2, F_4_2_4_2_DIAMETER_HOLE1_TIP, mode=Mode.SUBTRACT)

    # Ø5.0 (5) Diameter Hole1
    with Locations(Plane(origin=(0, 118.722415865, 0), x_dir=(1, 0, 0), z_dir=(0, 1, 0))):
        with Locations((241.95107426, 1052.218289838), (411.95107426, 1052.218289838), (411.95107426, 952.218289838), (241.95107426, 952.218289838)):
            Hole(F_5_0_5_DIAMETER_HOLE1_D / 2, depth=F_5_0_5_DIAMETER_HOLE1_DEPTH)
            with Locations((0, 0, -(F_5_0_5_DIAMETER_HOLE1_DEPTH + F_5_0_5_DIAMETER_HOLE1_TIP / 2))):  # 118° drill point
                Cone(0, F_5_0_5_DIAMETER_HOLE1_D / 2, F_5_0_5_DIAMETER_HOLE1_TIP, mode=Mode.SUBTRACT)

    # Sketch1<3> → Cut-Extrude2 (cut)
    with BuildSketch(Plane(origin=(0, 111.722415865, 0), x_dir=(1, 0, 0), z_dir=(0, 1, 0))):
        with BuildLine():
            Line((241.95107426, 942.218289838), (411.95107426, 942.218289838))
            ThreePointArc((411.95107426, 942.218289838), (419.022142072, 945.147222026), (421.95107426, 952.218289838))
            Line((421.95107426, 952.218289838), (421.95107426, 1052.218289838))
            ThreePointArc((421.95107426, 1052.218289838), (419.022142072, 1059.28935765), (411.95107426, 1062.218289838))
            Line((411.95107426, 1062.218289838), (241.95107426, 1062.218289838))
            ThreePointArc((241.95107426, 1062.218289838), (234.880006448, 1059.28935765), (231.95107426, 1052.218289838))
            Line((231.95107426, 1052.218289838), (231.95107426, 952.218289838))
            ThreePointArc((231.95107426, 952.218289838), (234.880006448, 945.147222026), (241.95107426, 942.218289838))
        make_face()
        with Locations((241.95107426, 952.218289838)):
            Circle(SKETCH1_3_R, mode=Mode.SUBTRACT)
        with Locations((411.95107426, 952.218289838)):
            Circle(SKETCH1_3_R, mode=Mode.SUBTRACT)
        with Locations((411.95107426, 1052.218289838)):
            Circle(SKETCH1_3_R, mode=Mode.SUBTRACT)
        with Locations((241.95107426, 1052.218289838)):
            Circle(SKETCH1_3_R, mode=Mode.SUBTRACT)
        with BuildLine():
            Line((249.45107426, 952.218289838), (249.45107426, 944.718289838))
            Line((249.45107426, 944.718289838), (404.45107426, 944.718289838))
            Line((404.45107426, 944.718289838), (404.45107426, 952.218289838))
            ThreePointArc((404.45107426, 952.218289838), (406.647773401, 957.521590697), (411.95107426, 959.718289838))
            Line((411.95107426, 959.718289838), (419.45107426, 959.718289838))
            Line((419.45107426, 959.718289838), (419.45107426, 1044.718289838))
            Line((419.45107426, 1044.718289838), (411.95107426, 1044.718289838))
            ThreePointArc((411.95107426, 1044.718289838), (406.647773401, 1046.914988979), (404.45107426, 1052.218289838))
            Line((404.45107426, 1052.218289838), (404.45107426, 1059.718289838))
            Line((404.45107426, 1059.718289838), (249.45107426, 1059.718289838))
            Line((249.45107426, 1059.718289838), (249.45107426, 1052.218289838))
            ThreePointArc((249.45107426, 1052.218289838), (247.254375119, 1046.914988979), (241.95107426, 1044.718289838))
            Line((241.95107426, 1044.718289838), (234.45107426, 1044.718289838))
            Line((234.45107426, 1044.718289838), (234.45107426, 959.718289838))
            Line((234.45107426, 959.718289838), (241.95107426, 959.718289838))
            ThreePointArc((241.95107426, 959.718289838), (247.254375119, 957.521590697), (249.45107426, 952.218289838))
        make_face(mode=Mode.SUBTRACT)
    extrude(amount=CUT_EXTRUDE2_DEPTH, mode=Mode.SUBTRACT)


solid = part.part
